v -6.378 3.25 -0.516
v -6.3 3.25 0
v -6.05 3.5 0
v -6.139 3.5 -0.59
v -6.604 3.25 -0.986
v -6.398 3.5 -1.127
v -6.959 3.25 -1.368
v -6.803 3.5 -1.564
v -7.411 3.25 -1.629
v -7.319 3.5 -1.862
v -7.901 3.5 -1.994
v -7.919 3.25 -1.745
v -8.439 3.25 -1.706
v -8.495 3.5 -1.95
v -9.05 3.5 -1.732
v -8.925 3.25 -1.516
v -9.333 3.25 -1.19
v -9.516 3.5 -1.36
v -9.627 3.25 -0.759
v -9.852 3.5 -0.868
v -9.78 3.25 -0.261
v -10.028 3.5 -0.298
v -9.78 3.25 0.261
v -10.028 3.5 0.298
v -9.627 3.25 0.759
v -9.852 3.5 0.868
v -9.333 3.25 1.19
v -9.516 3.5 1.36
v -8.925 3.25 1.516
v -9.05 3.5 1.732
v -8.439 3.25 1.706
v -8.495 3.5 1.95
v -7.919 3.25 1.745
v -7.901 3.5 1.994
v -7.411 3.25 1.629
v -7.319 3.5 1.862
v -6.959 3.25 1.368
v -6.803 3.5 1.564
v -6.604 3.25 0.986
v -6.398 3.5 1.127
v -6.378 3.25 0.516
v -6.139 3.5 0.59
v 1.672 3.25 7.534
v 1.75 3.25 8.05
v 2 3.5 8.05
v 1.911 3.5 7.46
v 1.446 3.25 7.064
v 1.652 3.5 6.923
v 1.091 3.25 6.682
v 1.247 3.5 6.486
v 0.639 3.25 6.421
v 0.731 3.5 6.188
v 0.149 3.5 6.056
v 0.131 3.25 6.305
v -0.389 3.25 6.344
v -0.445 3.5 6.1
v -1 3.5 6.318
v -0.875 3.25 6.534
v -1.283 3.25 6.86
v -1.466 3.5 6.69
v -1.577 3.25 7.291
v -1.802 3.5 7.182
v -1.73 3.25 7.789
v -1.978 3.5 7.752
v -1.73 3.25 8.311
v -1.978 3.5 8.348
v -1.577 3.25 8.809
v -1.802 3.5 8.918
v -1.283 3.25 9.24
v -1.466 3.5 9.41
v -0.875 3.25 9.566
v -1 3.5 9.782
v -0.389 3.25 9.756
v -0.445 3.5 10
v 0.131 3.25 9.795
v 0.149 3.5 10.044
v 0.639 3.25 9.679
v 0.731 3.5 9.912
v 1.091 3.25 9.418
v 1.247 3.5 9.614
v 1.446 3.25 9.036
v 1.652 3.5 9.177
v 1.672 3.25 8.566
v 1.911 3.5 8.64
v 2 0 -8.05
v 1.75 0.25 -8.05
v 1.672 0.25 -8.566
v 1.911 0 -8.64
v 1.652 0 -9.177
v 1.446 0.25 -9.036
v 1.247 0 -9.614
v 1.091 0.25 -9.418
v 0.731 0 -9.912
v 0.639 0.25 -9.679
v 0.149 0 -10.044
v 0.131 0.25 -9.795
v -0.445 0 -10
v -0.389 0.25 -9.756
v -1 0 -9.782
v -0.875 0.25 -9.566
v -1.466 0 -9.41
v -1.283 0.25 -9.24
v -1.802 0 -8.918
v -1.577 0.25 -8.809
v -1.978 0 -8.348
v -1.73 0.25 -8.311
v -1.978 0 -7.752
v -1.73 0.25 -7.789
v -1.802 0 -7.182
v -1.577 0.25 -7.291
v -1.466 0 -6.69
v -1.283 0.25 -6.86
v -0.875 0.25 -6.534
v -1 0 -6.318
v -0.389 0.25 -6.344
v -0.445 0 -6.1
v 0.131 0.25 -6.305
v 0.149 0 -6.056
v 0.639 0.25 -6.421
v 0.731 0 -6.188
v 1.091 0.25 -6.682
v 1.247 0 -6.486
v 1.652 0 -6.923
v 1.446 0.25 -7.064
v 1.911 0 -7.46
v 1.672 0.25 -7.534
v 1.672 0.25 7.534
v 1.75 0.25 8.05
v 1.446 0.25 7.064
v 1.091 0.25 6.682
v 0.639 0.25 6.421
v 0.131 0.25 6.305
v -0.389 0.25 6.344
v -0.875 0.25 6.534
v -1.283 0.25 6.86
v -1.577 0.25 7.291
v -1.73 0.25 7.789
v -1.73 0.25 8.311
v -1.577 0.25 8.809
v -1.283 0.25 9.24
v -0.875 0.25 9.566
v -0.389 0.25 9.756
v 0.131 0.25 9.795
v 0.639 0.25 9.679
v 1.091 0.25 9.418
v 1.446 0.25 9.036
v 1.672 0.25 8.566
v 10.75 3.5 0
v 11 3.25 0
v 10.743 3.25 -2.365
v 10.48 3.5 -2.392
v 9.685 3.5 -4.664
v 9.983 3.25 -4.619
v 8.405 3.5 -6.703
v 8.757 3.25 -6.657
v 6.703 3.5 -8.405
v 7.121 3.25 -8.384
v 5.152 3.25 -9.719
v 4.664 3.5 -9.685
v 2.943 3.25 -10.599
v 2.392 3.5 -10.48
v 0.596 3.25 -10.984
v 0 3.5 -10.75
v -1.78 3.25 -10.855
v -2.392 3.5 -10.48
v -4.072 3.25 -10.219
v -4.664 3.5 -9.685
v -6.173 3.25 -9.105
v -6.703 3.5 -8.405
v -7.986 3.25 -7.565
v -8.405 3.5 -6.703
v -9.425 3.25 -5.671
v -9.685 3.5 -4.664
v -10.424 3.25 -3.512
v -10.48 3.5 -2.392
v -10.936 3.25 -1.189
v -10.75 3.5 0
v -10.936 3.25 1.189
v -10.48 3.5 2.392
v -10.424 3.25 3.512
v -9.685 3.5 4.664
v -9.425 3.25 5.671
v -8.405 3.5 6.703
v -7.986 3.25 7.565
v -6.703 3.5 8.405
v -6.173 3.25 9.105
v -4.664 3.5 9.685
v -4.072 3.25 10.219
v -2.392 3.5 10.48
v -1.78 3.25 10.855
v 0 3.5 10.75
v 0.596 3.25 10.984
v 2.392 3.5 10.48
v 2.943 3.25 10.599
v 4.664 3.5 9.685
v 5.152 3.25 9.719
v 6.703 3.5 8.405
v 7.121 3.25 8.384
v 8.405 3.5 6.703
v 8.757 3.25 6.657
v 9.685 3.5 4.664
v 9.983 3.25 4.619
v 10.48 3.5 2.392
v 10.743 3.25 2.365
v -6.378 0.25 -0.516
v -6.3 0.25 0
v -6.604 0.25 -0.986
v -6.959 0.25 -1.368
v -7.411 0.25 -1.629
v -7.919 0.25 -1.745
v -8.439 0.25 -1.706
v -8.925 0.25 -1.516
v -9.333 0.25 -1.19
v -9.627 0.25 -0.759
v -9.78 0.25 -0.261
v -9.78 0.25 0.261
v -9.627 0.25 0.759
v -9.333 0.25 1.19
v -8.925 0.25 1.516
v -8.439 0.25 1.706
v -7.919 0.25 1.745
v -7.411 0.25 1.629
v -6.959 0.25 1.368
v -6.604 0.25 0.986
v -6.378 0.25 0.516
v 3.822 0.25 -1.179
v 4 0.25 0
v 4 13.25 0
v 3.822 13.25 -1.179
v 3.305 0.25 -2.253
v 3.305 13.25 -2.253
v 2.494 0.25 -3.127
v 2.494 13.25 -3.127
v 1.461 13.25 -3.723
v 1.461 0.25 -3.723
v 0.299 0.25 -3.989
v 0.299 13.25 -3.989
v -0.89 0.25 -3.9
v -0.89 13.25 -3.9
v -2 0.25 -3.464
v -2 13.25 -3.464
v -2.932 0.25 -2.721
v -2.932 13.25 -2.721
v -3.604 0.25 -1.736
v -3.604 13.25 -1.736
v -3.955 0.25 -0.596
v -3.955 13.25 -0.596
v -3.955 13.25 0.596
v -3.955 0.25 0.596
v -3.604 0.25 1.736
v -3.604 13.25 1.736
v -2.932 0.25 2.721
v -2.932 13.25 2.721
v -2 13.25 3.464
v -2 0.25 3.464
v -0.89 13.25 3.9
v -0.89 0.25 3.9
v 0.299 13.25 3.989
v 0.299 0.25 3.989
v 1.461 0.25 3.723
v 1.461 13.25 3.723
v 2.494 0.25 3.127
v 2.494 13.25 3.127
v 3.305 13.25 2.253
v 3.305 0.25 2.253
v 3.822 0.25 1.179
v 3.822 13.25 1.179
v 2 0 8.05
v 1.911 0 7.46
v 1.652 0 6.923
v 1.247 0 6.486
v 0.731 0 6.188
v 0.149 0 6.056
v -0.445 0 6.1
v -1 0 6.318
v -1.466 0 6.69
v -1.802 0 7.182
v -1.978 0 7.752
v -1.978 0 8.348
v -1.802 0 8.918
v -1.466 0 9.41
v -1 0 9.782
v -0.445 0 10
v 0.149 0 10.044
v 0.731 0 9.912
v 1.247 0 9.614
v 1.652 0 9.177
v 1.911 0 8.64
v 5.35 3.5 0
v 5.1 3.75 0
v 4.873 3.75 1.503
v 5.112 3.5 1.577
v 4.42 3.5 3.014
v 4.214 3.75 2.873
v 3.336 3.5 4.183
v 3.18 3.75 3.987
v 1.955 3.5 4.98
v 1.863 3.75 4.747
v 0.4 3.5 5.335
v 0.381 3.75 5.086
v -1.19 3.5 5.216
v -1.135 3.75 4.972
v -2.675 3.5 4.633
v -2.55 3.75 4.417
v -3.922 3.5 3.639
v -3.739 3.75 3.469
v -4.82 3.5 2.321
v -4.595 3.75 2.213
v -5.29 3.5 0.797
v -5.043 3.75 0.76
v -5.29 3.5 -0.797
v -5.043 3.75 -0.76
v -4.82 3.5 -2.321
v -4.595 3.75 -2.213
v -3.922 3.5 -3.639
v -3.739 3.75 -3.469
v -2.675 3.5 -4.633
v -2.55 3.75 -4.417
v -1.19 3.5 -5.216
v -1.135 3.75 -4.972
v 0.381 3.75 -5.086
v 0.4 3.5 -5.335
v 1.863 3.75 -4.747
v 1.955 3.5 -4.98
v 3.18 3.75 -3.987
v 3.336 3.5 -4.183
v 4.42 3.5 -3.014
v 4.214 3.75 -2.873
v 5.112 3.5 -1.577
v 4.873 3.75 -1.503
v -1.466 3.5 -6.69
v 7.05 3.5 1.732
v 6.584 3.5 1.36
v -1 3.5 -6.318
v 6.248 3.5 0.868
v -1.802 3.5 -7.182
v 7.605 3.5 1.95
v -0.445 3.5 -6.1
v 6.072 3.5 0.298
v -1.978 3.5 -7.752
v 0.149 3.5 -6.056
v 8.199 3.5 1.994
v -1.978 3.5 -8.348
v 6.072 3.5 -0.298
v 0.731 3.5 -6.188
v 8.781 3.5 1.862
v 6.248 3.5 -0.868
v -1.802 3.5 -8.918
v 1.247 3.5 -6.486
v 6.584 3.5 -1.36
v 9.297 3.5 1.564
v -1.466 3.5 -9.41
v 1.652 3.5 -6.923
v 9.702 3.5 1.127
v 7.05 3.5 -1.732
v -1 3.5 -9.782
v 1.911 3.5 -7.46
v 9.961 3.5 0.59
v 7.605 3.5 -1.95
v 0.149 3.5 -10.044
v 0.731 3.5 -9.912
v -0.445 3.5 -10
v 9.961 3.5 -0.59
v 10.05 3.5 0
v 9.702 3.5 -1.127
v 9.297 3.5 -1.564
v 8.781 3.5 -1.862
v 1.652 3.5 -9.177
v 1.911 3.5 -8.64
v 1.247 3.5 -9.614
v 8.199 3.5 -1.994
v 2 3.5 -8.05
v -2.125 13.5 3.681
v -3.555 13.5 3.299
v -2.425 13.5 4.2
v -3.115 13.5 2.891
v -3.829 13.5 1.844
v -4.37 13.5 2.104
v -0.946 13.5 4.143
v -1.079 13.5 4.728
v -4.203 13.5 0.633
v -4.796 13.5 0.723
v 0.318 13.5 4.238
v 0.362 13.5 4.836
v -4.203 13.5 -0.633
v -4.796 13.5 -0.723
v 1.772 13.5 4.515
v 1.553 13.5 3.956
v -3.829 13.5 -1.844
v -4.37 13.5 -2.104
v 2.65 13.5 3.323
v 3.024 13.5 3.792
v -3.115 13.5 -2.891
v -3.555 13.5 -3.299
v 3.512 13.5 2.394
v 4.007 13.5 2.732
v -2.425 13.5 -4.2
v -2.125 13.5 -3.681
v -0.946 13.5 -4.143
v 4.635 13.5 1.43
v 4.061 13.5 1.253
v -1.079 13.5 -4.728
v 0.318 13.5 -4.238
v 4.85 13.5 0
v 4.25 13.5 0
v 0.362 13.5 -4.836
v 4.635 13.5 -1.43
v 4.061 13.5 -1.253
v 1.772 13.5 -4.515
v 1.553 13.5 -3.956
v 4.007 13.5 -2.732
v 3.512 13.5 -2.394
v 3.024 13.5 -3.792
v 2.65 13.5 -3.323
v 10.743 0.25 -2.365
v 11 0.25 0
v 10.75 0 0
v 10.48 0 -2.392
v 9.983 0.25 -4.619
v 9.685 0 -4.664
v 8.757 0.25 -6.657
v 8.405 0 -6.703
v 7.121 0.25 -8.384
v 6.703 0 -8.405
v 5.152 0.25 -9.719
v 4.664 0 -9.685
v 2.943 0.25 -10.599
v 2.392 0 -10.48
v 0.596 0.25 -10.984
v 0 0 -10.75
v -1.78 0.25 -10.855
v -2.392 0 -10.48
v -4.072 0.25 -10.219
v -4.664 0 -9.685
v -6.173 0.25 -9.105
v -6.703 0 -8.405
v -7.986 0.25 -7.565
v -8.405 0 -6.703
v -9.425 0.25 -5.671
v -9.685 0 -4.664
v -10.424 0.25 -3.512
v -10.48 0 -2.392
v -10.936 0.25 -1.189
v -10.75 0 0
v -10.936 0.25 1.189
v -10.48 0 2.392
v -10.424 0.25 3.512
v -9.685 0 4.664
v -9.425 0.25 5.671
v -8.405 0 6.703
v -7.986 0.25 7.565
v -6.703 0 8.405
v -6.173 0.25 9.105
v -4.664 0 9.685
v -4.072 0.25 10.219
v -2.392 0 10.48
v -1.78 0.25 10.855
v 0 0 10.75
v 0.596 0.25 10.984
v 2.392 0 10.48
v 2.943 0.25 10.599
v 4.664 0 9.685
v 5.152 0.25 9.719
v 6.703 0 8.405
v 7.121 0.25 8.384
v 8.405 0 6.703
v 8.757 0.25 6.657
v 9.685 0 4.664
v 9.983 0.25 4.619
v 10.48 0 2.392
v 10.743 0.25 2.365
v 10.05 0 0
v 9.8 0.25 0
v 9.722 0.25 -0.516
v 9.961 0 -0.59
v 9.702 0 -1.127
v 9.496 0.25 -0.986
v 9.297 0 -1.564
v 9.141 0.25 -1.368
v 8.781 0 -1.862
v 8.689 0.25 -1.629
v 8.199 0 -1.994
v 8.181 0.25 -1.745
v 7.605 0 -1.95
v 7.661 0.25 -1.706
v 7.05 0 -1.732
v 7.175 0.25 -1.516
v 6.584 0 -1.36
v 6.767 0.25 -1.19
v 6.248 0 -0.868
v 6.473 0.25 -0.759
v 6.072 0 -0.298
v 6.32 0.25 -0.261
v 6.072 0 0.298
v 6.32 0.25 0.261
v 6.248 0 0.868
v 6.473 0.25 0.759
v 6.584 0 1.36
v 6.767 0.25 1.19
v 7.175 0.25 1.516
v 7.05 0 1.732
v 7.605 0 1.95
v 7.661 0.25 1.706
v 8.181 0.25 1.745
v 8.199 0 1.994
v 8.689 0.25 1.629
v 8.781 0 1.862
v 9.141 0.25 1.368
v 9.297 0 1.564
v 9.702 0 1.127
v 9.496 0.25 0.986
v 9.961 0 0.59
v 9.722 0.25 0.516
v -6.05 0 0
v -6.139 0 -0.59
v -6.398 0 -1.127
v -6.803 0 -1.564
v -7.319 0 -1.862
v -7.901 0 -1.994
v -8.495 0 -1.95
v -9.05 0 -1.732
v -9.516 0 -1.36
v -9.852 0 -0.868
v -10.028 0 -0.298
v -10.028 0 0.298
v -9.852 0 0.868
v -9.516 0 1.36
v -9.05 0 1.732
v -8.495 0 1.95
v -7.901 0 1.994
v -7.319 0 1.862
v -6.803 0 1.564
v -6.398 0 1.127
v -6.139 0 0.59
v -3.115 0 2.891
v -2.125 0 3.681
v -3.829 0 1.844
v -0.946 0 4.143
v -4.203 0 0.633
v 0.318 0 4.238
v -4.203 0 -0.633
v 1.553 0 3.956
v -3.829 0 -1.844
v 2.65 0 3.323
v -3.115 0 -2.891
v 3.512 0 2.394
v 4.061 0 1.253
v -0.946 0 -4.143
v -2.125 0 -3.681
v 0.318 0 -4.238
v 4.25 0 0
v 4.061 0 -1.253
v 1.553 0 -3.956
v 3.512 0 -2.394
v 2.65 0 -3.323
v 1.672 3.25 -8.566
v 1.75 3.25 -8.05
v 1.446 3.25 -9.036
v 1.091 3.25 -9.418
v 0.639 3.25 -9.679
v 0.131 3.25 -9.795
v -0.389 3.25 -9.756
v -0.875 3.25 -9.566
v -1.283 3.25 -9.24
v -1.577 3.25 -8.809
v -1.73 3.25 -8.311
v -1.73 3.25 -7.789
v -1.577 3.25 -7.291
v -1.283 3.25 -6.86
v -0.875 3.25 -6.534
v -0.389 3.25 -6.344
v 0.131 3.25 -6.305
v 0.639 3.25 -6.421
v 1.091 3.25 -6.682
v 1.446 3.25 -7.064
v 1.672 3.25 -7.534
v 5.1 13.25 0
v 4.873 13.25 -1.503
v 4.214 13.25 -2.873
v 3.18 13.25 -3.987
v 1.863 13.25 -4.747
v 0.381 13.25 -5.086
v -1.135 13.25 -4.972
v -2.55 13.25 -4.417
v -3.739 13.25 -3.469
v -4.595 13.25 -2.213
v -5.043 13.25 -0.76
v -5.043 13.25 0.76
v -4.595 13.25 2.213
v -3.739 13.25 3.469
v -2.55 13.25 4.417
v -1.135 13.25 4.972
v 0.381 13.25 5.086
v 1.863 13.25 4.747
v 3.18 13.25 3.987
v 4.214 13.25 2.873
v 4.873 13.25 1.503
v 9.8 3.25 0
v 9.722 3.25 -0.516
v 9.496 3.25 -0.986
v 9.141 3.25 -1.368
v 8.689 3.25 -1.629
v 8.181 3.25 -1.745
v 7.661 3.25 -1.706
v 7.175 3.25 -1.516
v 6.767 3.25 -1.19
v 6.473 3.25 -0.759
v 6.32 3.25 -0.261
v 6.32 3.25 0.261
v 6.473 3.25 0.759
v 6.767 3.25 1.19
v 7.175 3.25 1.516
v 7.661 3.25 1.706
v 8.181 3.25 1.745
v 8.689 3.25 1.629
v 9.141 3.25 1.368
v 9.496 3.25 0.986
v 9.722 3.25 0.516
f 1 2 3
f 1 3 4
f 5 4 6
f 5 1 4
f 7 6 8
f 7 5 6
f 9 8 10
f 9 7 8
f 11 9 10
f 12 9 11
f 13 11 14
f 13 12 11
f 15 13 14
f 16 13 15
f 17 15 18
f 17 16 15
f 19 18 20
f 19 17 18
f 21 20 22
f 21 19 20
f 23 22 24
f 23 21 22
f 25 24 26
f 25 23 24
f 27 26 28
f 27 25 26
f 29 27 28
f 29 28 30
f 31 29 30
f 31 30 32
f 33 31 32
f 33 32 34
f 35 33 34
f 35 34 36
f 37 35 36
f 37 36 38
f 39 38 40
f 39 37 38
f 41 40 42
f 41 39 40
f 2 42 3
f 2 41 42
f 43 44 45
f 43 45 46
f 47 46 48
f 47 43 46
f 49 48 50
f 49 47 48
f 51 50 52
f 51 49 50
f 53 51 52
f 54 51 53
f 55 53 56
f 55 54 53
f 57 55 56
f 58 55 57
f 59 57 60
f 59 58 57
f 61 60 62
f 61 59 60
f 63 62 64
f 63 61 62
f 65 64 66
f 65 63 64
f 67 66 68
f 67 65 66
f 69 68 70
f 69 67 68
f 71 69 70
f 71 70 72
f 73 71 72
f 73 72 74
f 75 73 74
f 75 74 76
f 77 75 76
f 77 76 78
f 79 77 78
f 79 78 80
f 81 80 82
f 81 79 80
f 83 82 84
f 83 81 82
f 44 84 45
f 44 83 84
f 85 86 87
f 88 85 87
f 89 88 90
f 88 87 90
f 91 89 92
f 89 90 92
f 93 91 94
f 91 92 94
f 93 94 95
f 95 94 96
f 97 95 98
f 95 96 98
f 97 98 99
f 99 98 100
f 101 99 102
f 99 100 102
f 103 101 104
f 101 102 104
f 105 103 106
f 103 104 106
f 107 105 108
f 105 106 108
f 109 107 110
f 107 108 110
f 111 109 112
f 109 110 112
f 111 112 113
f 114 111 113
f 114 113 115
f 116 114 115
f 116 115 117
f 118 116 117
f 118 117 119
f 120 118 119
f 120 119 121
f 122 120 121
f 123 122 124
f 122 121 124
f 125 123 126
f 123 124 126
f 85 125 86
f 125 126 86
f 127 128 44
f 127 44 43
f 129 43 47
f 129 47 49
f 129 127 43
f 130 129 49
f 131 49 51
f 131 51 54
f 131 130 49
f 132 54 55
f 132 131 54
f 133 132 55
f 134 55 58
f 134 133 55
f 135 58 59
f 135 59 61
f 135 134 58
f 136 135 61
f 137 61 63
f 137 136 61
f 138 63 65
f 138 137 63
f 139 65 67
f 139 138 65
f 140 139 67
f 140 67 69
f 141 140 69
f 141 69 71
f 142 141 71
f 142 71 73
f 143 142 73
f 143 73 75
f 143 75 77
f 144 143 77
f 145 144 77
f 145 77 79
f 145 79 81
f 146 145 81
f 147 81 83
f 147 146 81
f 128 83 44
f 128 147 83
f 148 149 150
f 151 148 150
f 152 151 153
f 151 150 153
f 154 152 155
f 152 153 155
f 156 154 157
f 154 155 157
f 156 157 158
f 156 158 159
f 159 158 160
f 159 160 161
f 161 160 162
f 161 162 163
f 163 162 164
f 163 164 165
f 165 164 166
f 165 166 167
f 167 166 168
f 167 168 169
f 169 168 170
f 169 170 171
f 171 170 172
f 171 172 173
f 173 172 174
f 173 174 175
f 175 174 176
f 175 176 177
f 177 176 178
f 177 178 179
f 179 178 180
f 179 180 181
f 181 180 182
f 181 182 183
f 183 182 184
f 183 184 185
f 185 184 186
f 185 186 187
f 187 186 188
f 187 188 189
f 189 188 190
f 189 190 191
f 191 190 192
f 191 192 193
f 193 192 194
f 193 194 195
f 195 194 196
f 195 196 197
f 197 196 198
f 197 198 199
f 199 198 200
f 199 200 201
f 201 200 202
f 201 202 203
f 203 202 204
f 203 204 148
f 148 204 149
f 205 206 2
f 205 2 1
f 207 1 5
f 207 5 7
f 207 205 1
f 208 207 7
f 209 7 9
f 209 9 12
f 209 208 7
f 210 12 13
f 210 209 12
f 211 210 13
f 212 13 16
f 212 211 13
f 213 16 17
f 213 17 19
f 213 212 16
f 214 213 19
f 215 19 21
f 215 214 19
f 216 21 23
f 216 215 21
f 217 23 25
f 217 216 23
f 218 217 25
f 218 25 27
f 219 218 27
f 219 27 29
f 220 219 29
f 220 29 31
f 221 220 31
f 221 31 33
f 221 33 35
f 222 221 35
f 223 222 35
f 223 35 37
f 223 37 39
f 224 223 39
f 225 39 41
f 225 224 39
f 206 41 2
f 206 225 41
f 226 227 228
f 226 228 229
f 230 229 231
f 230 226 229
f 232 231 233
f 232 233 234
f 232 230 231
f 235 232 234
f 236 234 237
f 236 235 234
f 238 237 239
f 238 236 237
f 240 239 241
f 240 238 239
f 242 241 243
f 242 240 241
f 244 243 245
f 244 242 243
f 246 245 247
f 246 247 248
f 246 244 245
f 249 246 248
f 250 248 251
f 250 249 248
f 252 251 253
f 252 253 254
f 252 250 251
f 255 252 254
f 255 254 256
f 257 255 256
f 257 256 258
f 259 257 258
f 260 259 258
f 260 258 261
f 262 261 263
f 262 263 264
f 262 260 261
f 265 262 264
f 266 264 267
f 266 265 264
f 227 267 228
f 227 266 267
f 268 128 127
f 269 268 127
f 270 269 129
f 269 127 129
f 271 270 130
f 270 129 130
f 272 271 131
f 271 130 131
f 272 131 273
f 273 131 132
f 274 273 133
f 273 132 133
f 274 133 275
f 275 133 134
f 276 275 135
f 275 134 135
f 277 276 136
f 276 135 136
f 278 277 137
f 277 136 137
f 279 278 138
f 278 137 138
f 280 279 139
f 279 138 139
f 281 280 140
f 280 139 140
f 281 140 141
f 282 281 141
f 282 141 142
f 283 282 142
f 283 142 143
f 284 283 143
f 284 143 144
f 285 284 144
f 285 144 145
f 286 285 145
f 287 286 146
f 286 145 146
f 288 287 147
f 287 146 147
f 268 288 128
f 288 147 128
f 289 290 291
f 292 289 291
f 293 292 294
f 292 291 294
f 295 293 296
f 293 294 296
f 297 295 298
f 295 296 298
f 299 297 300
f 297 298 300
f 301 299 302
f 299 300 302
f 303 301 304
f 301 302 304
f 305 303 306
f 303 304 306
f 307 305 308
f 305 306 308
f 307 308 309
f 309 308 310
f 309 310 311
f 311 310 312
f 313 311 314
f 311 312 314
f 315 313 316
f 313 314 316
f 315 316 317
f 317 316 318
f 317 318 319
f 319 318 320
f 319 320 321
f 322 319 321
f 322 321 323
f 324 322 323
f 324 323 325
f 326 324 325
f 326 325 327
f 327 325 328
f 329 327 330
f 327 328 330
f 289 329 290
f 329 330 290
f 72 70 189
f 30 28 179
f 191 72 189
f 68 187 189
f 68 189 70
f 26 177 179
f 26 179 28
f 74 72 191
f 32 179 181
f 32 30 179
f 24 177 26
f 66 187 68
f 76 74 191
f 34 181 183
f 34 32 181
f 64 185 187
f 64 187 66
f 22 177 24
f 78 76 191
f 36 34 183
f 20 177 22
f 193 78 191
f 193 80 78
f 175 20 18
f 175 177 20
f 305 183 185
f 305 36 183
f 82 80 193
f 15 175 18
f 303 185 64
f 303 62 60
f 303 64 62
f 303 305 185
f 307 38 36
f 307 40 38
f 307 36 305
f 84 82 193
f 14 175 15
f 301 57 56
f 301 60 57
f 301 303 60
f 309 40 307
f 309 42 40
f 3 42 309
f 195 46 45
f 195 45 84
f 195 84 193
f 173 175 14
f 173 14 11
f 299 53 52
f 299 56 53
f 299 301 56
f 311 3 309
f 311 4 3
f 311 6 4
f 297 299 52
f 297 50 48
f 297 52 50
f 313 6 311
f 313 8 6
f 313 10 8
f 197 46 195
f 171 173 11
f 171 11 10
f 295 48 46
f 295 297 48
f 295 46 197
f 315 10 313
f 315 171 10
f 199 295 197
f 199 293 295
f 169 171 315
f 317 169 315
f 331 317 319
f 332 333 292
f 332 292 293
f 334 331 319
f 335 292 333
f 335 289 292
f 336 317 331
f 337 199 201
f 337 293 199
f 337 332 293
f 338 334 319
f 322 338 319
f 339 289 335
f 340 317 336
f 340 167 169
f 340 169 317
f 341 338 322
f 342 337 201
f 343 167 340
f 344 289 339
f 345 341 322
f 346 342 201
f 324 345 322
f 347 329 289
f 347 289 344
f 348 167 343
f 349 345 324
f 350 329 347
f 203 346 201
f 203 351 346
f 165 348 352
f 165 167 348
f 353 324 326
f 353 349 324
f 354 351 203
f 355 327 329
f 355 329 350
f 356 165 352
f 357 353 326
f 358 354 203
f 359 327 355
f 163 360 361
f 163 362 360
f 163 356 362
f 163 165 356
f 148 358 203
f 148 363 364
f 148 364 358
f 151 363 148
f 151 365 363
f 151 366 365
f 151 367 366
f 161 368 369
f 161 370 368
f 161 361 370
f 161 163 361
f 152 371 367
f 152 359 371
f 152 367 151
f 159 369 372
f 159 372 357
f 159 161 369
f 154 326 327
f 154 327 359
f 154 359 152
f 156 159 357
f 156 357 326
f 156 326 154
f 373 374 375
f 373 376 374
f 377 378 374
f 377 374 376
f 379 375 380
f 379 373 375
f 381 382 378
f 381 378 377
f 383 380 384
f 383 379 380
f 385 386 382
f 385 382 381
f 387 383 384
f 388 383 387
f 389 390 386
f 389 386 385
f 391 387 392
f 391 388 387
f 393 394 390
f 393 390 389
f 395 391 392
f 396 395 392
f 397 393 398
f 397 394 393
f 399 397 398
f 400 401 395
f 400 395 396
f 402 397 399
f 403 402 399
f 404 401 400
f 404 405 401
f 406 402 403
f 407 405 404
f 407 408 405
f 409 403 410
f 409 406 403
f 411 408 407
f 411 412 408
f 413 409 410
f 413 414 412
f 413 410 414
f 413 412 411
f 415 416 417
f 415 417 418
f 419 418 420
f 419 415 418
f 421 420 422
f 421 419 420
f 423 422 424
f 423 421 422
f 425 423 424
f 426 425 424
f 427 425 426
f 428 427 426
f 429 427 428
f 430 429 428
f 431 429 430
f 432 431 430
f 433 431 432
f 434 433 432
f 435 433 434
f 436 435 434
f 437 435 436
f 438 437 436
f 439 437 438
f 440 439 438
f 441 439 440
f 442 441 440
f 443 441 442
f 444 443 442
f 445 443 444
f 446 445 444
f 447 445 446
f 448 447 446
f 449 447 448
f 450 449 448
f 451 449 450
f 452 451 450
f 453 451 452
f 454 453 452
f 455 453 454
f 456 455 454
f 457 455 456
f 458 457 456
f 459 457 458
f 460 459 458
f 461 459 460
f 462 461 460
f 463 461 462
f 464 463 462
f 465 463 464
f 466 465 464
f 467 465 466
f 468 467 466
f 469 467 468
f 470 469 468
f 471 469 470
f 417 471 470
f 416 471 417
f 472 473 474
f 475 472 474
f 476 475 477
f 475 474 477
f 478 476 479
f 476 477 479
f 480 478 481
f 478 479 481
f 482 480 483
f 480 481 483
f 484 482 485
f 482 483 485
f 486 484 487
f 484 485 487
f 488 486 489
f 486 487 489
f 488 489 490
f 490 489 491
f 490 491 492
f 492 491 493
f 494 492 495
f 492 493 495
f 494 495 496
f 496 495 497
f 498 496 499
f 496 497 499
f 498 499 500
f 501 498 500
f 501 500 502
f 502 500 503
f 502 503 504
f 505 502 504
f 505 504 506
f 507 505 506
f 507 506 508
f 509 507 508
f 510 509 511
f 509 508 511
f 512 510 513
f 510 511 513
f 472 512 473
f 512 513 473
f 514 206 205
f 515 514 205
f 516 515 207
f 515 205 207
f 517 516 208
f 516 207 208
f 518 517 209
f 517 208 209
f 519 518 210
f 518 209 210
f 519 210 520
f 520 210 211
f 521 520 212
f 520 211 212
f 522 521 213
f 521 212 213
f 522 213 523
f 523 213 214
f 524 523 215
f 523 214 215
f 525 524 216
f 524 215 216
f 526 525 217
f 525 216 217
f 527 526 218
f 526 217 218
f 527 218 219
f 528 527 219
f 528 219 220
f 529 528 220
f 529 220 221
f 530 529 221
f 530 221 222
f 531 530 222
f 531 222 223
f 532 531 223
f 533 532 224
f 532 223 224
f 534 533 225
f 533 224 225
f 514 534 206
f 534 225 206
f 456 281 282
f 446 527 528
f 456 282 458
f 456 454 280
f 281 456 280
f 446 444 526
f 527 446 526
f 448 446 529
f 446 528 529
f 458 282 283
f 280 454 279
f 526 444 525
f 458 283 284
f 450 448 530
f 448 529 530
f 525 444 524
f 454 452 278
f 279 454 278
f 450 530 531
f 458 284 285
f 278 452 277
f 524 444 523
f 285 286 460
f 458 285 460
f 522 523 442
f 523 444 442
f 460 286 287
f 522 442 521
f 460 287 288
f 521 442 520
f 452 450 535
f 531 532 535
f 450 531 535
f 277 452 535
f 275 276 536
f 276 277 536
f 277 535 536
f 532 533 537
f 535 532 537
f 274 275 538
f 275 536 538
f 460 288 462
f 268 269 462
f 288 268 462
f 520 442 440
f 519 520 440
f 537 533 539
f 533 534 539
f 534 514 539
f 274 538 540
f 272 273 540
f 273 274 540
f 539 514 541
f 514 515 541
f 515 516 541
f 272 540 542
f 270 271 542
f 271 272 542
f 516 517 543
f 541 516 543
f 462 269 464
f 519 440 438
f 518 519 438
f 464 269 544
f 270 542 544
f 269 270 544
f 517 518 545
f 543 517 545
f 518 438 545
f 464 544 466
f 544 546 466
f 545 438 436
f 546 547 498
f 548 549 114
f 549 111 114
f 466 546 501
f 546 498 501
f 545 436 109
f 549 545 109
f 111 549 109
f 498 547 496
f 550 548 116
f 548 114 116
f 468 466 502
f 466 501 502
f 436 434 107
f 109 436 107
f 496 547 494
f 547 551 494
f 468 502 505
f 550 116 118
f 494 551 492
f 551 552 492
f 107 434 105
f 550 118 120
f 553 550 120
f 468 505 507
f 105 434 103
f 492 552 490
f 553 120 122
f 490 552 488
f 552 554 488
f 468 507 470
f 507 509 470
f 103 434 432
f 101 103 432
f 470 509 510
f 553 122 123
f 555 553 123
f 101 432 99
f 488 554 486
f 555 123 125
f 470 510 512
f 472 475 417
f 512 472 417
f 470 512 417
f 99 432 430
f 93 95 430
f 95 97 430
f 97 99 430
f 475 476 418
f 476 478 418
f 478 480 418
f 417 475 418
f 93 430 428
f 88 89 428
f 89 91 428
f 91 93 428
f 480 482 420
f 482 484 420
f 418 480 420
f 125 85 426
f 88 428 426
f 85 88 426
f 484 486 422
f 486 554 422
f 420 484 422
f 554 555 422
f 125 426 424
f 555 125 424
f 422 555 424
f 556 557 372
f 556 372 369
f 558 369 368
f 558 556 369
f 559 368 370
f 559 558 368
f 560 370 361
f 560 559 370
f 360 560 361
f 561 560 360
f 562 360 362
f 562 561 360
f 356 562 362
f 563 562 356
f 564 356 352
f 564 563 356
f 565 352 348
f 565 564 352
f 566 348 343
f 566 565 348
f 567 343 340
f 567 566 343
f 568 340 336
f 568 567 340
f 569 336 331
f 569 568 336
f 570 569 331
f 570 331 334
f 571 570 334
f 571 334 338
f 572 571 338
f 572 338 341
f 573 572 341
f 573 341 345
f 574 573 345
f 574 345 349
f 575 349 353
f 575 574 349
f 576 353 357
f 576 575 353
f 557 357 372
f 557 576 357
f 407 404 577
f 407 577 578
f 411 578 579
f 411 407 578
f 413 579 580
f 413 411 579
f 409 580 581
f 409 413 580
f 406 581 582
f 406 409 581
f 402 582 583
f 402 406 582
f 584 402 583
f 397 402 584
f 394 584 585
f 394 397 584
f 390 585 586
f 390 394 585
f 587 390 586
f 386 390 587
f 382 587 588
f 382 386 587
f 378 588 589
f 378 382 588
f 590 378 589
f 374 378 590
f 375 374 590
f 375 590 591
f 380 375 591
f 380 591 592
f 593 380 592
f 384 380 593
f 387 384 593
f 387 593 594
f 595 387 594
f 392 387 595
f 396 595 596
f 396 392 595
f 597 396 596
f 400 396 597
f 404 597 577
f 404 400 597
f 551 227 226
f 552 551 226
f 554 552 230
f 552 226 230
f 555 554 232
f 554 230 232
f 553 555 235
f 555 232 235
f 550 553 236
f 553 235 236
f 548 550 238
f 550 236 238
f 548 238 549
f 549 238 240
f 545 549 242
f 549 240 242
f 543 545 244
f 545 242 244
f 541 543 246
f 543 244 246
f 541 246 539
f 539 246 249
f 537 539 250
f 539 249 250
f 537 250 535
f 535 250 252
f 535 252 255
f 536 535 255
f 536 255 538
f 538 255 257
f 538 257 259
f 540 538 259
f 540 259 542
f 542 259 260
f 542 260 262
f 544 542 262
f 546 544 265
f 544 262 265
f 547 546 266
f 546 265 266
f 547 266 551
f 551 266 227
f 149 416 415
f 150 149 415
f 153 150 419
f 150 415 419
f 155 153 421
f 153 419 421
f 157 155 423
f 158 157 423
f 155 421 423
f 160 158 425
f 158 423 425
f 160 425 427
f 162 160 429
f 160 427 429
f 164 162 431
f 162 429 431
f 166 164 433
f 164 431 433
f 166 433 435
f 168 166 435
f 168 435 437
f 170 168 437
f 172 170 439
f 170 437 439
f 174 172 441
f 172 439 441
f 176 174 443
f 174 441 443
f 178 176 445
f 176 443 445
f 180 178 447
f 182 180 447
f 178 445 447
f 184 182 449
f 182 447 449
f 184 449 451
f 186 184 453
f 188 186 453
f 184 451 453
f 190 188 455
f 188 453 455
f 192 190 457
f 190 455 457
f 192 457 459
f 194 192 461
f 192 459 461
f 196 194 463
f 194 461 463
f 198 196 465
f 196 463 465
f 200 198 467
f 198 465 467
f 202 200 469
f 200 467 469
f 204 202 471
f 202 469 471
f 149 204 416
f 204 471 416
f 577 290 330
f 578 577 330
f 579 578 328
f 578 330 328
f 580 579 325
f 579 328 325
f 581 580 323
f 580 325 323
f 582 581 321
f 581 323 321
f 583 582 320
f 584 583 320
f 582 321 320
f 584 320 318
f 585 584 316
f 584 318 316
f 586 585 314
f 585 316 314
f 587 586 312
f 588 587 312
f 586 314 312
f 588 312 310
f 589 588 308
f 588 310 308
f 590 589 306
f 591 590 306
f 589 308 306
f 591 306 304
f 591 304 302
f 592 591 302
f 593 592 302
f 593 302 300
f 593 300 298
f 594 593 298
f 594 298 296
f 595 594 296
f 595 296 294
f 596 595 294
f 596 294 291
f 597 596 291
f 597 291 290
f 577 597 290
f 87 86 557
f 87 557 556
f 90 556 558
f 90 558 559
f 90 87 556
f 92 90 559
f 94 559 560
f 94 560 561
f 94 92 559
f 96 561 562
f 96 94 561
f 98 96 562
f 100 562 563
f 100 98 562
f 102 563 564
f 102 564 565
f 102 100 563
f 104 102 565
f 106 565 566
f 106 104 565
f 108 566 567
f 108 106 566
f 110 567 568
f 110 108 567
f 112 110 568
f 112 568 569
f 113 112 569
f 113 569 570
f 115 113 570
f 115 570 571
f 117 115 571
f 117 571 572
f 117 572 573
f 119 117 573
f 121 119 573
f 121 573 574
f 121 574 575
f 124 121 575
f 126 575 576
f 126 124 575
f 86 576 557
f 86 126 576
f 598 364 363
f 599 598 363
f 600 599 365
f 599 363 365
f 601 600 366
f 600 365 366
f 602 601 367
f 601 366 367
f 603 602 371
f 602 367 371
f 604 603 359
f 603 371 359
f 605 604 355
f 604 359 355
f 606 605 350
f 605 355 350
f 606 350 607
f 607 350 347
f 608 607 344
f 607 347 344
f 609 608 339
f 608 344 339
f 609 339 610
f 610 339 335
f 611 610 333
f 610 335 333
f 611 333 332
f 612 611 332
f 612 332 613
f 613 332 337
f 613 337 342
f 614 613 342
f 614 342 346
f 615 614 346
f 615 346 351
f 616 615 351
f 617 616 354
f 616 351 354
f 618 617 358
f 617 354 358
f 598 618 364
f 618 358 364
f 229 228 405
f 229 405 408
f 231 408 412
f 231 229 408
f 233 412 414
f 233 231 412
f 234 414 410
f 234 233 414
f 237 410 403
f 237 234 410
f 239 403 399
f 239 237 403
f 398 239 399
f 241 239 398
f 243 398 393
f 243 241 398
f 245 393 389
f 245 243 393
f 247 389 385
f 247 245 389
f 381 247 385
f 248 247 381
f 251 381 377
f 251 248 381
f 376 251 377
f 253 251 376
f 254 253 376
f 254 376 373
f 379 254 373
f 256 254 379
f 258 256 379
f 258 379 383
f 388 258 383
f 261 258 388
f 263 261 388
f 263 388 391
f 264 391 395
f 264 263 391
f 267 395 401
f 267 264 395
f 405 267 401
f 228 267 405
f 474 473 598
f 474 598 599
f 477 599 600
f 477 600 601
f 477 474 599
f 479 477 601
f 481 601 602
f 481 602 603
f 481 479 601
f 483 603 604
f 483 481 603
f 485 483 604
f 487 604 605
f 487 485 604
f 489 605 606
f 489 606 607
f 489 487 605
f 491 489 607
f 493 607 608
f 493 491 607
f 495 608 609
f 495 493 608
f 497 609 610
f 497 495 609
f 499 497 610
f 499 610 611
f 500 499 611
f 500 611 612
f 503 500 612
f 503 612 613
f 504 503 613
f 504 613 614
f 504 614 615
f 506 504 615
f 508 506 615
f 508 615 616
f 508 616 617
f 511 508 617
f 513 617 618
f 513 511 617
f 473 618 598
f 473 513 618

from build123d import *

# Parameters (mm, degrees)
SKETCH1_R           = 11
SKETCH1_R_2         = 1.75
SKETCH1_R_3         = 4
BOSS_EXTRUDE1_DEPTH = 3.5
SKETCH1_3_R         = 5.1
SKETCH1_3_R_2       = 4
BOSS_EXTRUDE2_DEPTH = 13.5
CHAMFER1_SIZE       = 0.25


with BuildPart() as part:
    # Sketch1 → Boss-Extrude1 (new body)
    with BuildSketch(Plane(origin=(0, 0, 0), x_dir=(1, 0, 0), z_dir=(0, 1, 0))):
        Circle(SKETCH1_R)
        with Locations((-8.05, 0)):
            Circle(SKETCH1_R_2, mode=Mode.SUBTRACT)
        with Locations((0, -8.05)):
            Circle(SKETCH1_R_2, mode=Mode.SUBTRACT)
        with Locations((8.05, 0)):
            Circle(SKETCH1_R_2, mode=Mode.SUBTRACT)
        with Locations((0, 8.05)):
            Circle(SKETCH1_R_2, mode=Mode.SUBTRACT)
        Circle(SKETCH1_R_3, mode=Mode.SUBTRACT)
    extrude(amount=BOSS_EXTRUDE1_DEPTH)

    # Sketch1<3> → Boss-Extrude2 (add)
    with BuildSketch(Plane(origin=(0, 0, 0), x_dir=(1, 0, 0), z_dir=(0, 1, 0))):
        Circle(SKETCH1_3_R)
        Circle(SKETCH1_3_R_2, mode=Mode.SUBTRACT)
    extrude(amount=BOSS_EXTRUDE2_DEPTH)

    # Chamfer1
    chamfer1_edges = [part.edges().sort_by_distance(p)[0] for p in [
        (6.3, 3.5, 0),
        (6.3, 0, 0),
        (-1.75, 3.5, -8.05),
        (-1.75, 0, -8.05),
        (-1.75, 0, 8.05),
        (-1.75, 3.5, 8.05),
        (-9.8, 0, 0),
        (-9.8, 3.5, 0),
        (-4, 13.5, 0),
        (-5.1, 13.5, 0),
        (-5.1, 3.5, 0),
        (-11, 3.5, 0),
        (-11, 0, 0),
        (-4, 0, 0),
    ]]
    chamfer(chamfer1_edges, length=CHAMFER1_SIZE)


solid = part.part
